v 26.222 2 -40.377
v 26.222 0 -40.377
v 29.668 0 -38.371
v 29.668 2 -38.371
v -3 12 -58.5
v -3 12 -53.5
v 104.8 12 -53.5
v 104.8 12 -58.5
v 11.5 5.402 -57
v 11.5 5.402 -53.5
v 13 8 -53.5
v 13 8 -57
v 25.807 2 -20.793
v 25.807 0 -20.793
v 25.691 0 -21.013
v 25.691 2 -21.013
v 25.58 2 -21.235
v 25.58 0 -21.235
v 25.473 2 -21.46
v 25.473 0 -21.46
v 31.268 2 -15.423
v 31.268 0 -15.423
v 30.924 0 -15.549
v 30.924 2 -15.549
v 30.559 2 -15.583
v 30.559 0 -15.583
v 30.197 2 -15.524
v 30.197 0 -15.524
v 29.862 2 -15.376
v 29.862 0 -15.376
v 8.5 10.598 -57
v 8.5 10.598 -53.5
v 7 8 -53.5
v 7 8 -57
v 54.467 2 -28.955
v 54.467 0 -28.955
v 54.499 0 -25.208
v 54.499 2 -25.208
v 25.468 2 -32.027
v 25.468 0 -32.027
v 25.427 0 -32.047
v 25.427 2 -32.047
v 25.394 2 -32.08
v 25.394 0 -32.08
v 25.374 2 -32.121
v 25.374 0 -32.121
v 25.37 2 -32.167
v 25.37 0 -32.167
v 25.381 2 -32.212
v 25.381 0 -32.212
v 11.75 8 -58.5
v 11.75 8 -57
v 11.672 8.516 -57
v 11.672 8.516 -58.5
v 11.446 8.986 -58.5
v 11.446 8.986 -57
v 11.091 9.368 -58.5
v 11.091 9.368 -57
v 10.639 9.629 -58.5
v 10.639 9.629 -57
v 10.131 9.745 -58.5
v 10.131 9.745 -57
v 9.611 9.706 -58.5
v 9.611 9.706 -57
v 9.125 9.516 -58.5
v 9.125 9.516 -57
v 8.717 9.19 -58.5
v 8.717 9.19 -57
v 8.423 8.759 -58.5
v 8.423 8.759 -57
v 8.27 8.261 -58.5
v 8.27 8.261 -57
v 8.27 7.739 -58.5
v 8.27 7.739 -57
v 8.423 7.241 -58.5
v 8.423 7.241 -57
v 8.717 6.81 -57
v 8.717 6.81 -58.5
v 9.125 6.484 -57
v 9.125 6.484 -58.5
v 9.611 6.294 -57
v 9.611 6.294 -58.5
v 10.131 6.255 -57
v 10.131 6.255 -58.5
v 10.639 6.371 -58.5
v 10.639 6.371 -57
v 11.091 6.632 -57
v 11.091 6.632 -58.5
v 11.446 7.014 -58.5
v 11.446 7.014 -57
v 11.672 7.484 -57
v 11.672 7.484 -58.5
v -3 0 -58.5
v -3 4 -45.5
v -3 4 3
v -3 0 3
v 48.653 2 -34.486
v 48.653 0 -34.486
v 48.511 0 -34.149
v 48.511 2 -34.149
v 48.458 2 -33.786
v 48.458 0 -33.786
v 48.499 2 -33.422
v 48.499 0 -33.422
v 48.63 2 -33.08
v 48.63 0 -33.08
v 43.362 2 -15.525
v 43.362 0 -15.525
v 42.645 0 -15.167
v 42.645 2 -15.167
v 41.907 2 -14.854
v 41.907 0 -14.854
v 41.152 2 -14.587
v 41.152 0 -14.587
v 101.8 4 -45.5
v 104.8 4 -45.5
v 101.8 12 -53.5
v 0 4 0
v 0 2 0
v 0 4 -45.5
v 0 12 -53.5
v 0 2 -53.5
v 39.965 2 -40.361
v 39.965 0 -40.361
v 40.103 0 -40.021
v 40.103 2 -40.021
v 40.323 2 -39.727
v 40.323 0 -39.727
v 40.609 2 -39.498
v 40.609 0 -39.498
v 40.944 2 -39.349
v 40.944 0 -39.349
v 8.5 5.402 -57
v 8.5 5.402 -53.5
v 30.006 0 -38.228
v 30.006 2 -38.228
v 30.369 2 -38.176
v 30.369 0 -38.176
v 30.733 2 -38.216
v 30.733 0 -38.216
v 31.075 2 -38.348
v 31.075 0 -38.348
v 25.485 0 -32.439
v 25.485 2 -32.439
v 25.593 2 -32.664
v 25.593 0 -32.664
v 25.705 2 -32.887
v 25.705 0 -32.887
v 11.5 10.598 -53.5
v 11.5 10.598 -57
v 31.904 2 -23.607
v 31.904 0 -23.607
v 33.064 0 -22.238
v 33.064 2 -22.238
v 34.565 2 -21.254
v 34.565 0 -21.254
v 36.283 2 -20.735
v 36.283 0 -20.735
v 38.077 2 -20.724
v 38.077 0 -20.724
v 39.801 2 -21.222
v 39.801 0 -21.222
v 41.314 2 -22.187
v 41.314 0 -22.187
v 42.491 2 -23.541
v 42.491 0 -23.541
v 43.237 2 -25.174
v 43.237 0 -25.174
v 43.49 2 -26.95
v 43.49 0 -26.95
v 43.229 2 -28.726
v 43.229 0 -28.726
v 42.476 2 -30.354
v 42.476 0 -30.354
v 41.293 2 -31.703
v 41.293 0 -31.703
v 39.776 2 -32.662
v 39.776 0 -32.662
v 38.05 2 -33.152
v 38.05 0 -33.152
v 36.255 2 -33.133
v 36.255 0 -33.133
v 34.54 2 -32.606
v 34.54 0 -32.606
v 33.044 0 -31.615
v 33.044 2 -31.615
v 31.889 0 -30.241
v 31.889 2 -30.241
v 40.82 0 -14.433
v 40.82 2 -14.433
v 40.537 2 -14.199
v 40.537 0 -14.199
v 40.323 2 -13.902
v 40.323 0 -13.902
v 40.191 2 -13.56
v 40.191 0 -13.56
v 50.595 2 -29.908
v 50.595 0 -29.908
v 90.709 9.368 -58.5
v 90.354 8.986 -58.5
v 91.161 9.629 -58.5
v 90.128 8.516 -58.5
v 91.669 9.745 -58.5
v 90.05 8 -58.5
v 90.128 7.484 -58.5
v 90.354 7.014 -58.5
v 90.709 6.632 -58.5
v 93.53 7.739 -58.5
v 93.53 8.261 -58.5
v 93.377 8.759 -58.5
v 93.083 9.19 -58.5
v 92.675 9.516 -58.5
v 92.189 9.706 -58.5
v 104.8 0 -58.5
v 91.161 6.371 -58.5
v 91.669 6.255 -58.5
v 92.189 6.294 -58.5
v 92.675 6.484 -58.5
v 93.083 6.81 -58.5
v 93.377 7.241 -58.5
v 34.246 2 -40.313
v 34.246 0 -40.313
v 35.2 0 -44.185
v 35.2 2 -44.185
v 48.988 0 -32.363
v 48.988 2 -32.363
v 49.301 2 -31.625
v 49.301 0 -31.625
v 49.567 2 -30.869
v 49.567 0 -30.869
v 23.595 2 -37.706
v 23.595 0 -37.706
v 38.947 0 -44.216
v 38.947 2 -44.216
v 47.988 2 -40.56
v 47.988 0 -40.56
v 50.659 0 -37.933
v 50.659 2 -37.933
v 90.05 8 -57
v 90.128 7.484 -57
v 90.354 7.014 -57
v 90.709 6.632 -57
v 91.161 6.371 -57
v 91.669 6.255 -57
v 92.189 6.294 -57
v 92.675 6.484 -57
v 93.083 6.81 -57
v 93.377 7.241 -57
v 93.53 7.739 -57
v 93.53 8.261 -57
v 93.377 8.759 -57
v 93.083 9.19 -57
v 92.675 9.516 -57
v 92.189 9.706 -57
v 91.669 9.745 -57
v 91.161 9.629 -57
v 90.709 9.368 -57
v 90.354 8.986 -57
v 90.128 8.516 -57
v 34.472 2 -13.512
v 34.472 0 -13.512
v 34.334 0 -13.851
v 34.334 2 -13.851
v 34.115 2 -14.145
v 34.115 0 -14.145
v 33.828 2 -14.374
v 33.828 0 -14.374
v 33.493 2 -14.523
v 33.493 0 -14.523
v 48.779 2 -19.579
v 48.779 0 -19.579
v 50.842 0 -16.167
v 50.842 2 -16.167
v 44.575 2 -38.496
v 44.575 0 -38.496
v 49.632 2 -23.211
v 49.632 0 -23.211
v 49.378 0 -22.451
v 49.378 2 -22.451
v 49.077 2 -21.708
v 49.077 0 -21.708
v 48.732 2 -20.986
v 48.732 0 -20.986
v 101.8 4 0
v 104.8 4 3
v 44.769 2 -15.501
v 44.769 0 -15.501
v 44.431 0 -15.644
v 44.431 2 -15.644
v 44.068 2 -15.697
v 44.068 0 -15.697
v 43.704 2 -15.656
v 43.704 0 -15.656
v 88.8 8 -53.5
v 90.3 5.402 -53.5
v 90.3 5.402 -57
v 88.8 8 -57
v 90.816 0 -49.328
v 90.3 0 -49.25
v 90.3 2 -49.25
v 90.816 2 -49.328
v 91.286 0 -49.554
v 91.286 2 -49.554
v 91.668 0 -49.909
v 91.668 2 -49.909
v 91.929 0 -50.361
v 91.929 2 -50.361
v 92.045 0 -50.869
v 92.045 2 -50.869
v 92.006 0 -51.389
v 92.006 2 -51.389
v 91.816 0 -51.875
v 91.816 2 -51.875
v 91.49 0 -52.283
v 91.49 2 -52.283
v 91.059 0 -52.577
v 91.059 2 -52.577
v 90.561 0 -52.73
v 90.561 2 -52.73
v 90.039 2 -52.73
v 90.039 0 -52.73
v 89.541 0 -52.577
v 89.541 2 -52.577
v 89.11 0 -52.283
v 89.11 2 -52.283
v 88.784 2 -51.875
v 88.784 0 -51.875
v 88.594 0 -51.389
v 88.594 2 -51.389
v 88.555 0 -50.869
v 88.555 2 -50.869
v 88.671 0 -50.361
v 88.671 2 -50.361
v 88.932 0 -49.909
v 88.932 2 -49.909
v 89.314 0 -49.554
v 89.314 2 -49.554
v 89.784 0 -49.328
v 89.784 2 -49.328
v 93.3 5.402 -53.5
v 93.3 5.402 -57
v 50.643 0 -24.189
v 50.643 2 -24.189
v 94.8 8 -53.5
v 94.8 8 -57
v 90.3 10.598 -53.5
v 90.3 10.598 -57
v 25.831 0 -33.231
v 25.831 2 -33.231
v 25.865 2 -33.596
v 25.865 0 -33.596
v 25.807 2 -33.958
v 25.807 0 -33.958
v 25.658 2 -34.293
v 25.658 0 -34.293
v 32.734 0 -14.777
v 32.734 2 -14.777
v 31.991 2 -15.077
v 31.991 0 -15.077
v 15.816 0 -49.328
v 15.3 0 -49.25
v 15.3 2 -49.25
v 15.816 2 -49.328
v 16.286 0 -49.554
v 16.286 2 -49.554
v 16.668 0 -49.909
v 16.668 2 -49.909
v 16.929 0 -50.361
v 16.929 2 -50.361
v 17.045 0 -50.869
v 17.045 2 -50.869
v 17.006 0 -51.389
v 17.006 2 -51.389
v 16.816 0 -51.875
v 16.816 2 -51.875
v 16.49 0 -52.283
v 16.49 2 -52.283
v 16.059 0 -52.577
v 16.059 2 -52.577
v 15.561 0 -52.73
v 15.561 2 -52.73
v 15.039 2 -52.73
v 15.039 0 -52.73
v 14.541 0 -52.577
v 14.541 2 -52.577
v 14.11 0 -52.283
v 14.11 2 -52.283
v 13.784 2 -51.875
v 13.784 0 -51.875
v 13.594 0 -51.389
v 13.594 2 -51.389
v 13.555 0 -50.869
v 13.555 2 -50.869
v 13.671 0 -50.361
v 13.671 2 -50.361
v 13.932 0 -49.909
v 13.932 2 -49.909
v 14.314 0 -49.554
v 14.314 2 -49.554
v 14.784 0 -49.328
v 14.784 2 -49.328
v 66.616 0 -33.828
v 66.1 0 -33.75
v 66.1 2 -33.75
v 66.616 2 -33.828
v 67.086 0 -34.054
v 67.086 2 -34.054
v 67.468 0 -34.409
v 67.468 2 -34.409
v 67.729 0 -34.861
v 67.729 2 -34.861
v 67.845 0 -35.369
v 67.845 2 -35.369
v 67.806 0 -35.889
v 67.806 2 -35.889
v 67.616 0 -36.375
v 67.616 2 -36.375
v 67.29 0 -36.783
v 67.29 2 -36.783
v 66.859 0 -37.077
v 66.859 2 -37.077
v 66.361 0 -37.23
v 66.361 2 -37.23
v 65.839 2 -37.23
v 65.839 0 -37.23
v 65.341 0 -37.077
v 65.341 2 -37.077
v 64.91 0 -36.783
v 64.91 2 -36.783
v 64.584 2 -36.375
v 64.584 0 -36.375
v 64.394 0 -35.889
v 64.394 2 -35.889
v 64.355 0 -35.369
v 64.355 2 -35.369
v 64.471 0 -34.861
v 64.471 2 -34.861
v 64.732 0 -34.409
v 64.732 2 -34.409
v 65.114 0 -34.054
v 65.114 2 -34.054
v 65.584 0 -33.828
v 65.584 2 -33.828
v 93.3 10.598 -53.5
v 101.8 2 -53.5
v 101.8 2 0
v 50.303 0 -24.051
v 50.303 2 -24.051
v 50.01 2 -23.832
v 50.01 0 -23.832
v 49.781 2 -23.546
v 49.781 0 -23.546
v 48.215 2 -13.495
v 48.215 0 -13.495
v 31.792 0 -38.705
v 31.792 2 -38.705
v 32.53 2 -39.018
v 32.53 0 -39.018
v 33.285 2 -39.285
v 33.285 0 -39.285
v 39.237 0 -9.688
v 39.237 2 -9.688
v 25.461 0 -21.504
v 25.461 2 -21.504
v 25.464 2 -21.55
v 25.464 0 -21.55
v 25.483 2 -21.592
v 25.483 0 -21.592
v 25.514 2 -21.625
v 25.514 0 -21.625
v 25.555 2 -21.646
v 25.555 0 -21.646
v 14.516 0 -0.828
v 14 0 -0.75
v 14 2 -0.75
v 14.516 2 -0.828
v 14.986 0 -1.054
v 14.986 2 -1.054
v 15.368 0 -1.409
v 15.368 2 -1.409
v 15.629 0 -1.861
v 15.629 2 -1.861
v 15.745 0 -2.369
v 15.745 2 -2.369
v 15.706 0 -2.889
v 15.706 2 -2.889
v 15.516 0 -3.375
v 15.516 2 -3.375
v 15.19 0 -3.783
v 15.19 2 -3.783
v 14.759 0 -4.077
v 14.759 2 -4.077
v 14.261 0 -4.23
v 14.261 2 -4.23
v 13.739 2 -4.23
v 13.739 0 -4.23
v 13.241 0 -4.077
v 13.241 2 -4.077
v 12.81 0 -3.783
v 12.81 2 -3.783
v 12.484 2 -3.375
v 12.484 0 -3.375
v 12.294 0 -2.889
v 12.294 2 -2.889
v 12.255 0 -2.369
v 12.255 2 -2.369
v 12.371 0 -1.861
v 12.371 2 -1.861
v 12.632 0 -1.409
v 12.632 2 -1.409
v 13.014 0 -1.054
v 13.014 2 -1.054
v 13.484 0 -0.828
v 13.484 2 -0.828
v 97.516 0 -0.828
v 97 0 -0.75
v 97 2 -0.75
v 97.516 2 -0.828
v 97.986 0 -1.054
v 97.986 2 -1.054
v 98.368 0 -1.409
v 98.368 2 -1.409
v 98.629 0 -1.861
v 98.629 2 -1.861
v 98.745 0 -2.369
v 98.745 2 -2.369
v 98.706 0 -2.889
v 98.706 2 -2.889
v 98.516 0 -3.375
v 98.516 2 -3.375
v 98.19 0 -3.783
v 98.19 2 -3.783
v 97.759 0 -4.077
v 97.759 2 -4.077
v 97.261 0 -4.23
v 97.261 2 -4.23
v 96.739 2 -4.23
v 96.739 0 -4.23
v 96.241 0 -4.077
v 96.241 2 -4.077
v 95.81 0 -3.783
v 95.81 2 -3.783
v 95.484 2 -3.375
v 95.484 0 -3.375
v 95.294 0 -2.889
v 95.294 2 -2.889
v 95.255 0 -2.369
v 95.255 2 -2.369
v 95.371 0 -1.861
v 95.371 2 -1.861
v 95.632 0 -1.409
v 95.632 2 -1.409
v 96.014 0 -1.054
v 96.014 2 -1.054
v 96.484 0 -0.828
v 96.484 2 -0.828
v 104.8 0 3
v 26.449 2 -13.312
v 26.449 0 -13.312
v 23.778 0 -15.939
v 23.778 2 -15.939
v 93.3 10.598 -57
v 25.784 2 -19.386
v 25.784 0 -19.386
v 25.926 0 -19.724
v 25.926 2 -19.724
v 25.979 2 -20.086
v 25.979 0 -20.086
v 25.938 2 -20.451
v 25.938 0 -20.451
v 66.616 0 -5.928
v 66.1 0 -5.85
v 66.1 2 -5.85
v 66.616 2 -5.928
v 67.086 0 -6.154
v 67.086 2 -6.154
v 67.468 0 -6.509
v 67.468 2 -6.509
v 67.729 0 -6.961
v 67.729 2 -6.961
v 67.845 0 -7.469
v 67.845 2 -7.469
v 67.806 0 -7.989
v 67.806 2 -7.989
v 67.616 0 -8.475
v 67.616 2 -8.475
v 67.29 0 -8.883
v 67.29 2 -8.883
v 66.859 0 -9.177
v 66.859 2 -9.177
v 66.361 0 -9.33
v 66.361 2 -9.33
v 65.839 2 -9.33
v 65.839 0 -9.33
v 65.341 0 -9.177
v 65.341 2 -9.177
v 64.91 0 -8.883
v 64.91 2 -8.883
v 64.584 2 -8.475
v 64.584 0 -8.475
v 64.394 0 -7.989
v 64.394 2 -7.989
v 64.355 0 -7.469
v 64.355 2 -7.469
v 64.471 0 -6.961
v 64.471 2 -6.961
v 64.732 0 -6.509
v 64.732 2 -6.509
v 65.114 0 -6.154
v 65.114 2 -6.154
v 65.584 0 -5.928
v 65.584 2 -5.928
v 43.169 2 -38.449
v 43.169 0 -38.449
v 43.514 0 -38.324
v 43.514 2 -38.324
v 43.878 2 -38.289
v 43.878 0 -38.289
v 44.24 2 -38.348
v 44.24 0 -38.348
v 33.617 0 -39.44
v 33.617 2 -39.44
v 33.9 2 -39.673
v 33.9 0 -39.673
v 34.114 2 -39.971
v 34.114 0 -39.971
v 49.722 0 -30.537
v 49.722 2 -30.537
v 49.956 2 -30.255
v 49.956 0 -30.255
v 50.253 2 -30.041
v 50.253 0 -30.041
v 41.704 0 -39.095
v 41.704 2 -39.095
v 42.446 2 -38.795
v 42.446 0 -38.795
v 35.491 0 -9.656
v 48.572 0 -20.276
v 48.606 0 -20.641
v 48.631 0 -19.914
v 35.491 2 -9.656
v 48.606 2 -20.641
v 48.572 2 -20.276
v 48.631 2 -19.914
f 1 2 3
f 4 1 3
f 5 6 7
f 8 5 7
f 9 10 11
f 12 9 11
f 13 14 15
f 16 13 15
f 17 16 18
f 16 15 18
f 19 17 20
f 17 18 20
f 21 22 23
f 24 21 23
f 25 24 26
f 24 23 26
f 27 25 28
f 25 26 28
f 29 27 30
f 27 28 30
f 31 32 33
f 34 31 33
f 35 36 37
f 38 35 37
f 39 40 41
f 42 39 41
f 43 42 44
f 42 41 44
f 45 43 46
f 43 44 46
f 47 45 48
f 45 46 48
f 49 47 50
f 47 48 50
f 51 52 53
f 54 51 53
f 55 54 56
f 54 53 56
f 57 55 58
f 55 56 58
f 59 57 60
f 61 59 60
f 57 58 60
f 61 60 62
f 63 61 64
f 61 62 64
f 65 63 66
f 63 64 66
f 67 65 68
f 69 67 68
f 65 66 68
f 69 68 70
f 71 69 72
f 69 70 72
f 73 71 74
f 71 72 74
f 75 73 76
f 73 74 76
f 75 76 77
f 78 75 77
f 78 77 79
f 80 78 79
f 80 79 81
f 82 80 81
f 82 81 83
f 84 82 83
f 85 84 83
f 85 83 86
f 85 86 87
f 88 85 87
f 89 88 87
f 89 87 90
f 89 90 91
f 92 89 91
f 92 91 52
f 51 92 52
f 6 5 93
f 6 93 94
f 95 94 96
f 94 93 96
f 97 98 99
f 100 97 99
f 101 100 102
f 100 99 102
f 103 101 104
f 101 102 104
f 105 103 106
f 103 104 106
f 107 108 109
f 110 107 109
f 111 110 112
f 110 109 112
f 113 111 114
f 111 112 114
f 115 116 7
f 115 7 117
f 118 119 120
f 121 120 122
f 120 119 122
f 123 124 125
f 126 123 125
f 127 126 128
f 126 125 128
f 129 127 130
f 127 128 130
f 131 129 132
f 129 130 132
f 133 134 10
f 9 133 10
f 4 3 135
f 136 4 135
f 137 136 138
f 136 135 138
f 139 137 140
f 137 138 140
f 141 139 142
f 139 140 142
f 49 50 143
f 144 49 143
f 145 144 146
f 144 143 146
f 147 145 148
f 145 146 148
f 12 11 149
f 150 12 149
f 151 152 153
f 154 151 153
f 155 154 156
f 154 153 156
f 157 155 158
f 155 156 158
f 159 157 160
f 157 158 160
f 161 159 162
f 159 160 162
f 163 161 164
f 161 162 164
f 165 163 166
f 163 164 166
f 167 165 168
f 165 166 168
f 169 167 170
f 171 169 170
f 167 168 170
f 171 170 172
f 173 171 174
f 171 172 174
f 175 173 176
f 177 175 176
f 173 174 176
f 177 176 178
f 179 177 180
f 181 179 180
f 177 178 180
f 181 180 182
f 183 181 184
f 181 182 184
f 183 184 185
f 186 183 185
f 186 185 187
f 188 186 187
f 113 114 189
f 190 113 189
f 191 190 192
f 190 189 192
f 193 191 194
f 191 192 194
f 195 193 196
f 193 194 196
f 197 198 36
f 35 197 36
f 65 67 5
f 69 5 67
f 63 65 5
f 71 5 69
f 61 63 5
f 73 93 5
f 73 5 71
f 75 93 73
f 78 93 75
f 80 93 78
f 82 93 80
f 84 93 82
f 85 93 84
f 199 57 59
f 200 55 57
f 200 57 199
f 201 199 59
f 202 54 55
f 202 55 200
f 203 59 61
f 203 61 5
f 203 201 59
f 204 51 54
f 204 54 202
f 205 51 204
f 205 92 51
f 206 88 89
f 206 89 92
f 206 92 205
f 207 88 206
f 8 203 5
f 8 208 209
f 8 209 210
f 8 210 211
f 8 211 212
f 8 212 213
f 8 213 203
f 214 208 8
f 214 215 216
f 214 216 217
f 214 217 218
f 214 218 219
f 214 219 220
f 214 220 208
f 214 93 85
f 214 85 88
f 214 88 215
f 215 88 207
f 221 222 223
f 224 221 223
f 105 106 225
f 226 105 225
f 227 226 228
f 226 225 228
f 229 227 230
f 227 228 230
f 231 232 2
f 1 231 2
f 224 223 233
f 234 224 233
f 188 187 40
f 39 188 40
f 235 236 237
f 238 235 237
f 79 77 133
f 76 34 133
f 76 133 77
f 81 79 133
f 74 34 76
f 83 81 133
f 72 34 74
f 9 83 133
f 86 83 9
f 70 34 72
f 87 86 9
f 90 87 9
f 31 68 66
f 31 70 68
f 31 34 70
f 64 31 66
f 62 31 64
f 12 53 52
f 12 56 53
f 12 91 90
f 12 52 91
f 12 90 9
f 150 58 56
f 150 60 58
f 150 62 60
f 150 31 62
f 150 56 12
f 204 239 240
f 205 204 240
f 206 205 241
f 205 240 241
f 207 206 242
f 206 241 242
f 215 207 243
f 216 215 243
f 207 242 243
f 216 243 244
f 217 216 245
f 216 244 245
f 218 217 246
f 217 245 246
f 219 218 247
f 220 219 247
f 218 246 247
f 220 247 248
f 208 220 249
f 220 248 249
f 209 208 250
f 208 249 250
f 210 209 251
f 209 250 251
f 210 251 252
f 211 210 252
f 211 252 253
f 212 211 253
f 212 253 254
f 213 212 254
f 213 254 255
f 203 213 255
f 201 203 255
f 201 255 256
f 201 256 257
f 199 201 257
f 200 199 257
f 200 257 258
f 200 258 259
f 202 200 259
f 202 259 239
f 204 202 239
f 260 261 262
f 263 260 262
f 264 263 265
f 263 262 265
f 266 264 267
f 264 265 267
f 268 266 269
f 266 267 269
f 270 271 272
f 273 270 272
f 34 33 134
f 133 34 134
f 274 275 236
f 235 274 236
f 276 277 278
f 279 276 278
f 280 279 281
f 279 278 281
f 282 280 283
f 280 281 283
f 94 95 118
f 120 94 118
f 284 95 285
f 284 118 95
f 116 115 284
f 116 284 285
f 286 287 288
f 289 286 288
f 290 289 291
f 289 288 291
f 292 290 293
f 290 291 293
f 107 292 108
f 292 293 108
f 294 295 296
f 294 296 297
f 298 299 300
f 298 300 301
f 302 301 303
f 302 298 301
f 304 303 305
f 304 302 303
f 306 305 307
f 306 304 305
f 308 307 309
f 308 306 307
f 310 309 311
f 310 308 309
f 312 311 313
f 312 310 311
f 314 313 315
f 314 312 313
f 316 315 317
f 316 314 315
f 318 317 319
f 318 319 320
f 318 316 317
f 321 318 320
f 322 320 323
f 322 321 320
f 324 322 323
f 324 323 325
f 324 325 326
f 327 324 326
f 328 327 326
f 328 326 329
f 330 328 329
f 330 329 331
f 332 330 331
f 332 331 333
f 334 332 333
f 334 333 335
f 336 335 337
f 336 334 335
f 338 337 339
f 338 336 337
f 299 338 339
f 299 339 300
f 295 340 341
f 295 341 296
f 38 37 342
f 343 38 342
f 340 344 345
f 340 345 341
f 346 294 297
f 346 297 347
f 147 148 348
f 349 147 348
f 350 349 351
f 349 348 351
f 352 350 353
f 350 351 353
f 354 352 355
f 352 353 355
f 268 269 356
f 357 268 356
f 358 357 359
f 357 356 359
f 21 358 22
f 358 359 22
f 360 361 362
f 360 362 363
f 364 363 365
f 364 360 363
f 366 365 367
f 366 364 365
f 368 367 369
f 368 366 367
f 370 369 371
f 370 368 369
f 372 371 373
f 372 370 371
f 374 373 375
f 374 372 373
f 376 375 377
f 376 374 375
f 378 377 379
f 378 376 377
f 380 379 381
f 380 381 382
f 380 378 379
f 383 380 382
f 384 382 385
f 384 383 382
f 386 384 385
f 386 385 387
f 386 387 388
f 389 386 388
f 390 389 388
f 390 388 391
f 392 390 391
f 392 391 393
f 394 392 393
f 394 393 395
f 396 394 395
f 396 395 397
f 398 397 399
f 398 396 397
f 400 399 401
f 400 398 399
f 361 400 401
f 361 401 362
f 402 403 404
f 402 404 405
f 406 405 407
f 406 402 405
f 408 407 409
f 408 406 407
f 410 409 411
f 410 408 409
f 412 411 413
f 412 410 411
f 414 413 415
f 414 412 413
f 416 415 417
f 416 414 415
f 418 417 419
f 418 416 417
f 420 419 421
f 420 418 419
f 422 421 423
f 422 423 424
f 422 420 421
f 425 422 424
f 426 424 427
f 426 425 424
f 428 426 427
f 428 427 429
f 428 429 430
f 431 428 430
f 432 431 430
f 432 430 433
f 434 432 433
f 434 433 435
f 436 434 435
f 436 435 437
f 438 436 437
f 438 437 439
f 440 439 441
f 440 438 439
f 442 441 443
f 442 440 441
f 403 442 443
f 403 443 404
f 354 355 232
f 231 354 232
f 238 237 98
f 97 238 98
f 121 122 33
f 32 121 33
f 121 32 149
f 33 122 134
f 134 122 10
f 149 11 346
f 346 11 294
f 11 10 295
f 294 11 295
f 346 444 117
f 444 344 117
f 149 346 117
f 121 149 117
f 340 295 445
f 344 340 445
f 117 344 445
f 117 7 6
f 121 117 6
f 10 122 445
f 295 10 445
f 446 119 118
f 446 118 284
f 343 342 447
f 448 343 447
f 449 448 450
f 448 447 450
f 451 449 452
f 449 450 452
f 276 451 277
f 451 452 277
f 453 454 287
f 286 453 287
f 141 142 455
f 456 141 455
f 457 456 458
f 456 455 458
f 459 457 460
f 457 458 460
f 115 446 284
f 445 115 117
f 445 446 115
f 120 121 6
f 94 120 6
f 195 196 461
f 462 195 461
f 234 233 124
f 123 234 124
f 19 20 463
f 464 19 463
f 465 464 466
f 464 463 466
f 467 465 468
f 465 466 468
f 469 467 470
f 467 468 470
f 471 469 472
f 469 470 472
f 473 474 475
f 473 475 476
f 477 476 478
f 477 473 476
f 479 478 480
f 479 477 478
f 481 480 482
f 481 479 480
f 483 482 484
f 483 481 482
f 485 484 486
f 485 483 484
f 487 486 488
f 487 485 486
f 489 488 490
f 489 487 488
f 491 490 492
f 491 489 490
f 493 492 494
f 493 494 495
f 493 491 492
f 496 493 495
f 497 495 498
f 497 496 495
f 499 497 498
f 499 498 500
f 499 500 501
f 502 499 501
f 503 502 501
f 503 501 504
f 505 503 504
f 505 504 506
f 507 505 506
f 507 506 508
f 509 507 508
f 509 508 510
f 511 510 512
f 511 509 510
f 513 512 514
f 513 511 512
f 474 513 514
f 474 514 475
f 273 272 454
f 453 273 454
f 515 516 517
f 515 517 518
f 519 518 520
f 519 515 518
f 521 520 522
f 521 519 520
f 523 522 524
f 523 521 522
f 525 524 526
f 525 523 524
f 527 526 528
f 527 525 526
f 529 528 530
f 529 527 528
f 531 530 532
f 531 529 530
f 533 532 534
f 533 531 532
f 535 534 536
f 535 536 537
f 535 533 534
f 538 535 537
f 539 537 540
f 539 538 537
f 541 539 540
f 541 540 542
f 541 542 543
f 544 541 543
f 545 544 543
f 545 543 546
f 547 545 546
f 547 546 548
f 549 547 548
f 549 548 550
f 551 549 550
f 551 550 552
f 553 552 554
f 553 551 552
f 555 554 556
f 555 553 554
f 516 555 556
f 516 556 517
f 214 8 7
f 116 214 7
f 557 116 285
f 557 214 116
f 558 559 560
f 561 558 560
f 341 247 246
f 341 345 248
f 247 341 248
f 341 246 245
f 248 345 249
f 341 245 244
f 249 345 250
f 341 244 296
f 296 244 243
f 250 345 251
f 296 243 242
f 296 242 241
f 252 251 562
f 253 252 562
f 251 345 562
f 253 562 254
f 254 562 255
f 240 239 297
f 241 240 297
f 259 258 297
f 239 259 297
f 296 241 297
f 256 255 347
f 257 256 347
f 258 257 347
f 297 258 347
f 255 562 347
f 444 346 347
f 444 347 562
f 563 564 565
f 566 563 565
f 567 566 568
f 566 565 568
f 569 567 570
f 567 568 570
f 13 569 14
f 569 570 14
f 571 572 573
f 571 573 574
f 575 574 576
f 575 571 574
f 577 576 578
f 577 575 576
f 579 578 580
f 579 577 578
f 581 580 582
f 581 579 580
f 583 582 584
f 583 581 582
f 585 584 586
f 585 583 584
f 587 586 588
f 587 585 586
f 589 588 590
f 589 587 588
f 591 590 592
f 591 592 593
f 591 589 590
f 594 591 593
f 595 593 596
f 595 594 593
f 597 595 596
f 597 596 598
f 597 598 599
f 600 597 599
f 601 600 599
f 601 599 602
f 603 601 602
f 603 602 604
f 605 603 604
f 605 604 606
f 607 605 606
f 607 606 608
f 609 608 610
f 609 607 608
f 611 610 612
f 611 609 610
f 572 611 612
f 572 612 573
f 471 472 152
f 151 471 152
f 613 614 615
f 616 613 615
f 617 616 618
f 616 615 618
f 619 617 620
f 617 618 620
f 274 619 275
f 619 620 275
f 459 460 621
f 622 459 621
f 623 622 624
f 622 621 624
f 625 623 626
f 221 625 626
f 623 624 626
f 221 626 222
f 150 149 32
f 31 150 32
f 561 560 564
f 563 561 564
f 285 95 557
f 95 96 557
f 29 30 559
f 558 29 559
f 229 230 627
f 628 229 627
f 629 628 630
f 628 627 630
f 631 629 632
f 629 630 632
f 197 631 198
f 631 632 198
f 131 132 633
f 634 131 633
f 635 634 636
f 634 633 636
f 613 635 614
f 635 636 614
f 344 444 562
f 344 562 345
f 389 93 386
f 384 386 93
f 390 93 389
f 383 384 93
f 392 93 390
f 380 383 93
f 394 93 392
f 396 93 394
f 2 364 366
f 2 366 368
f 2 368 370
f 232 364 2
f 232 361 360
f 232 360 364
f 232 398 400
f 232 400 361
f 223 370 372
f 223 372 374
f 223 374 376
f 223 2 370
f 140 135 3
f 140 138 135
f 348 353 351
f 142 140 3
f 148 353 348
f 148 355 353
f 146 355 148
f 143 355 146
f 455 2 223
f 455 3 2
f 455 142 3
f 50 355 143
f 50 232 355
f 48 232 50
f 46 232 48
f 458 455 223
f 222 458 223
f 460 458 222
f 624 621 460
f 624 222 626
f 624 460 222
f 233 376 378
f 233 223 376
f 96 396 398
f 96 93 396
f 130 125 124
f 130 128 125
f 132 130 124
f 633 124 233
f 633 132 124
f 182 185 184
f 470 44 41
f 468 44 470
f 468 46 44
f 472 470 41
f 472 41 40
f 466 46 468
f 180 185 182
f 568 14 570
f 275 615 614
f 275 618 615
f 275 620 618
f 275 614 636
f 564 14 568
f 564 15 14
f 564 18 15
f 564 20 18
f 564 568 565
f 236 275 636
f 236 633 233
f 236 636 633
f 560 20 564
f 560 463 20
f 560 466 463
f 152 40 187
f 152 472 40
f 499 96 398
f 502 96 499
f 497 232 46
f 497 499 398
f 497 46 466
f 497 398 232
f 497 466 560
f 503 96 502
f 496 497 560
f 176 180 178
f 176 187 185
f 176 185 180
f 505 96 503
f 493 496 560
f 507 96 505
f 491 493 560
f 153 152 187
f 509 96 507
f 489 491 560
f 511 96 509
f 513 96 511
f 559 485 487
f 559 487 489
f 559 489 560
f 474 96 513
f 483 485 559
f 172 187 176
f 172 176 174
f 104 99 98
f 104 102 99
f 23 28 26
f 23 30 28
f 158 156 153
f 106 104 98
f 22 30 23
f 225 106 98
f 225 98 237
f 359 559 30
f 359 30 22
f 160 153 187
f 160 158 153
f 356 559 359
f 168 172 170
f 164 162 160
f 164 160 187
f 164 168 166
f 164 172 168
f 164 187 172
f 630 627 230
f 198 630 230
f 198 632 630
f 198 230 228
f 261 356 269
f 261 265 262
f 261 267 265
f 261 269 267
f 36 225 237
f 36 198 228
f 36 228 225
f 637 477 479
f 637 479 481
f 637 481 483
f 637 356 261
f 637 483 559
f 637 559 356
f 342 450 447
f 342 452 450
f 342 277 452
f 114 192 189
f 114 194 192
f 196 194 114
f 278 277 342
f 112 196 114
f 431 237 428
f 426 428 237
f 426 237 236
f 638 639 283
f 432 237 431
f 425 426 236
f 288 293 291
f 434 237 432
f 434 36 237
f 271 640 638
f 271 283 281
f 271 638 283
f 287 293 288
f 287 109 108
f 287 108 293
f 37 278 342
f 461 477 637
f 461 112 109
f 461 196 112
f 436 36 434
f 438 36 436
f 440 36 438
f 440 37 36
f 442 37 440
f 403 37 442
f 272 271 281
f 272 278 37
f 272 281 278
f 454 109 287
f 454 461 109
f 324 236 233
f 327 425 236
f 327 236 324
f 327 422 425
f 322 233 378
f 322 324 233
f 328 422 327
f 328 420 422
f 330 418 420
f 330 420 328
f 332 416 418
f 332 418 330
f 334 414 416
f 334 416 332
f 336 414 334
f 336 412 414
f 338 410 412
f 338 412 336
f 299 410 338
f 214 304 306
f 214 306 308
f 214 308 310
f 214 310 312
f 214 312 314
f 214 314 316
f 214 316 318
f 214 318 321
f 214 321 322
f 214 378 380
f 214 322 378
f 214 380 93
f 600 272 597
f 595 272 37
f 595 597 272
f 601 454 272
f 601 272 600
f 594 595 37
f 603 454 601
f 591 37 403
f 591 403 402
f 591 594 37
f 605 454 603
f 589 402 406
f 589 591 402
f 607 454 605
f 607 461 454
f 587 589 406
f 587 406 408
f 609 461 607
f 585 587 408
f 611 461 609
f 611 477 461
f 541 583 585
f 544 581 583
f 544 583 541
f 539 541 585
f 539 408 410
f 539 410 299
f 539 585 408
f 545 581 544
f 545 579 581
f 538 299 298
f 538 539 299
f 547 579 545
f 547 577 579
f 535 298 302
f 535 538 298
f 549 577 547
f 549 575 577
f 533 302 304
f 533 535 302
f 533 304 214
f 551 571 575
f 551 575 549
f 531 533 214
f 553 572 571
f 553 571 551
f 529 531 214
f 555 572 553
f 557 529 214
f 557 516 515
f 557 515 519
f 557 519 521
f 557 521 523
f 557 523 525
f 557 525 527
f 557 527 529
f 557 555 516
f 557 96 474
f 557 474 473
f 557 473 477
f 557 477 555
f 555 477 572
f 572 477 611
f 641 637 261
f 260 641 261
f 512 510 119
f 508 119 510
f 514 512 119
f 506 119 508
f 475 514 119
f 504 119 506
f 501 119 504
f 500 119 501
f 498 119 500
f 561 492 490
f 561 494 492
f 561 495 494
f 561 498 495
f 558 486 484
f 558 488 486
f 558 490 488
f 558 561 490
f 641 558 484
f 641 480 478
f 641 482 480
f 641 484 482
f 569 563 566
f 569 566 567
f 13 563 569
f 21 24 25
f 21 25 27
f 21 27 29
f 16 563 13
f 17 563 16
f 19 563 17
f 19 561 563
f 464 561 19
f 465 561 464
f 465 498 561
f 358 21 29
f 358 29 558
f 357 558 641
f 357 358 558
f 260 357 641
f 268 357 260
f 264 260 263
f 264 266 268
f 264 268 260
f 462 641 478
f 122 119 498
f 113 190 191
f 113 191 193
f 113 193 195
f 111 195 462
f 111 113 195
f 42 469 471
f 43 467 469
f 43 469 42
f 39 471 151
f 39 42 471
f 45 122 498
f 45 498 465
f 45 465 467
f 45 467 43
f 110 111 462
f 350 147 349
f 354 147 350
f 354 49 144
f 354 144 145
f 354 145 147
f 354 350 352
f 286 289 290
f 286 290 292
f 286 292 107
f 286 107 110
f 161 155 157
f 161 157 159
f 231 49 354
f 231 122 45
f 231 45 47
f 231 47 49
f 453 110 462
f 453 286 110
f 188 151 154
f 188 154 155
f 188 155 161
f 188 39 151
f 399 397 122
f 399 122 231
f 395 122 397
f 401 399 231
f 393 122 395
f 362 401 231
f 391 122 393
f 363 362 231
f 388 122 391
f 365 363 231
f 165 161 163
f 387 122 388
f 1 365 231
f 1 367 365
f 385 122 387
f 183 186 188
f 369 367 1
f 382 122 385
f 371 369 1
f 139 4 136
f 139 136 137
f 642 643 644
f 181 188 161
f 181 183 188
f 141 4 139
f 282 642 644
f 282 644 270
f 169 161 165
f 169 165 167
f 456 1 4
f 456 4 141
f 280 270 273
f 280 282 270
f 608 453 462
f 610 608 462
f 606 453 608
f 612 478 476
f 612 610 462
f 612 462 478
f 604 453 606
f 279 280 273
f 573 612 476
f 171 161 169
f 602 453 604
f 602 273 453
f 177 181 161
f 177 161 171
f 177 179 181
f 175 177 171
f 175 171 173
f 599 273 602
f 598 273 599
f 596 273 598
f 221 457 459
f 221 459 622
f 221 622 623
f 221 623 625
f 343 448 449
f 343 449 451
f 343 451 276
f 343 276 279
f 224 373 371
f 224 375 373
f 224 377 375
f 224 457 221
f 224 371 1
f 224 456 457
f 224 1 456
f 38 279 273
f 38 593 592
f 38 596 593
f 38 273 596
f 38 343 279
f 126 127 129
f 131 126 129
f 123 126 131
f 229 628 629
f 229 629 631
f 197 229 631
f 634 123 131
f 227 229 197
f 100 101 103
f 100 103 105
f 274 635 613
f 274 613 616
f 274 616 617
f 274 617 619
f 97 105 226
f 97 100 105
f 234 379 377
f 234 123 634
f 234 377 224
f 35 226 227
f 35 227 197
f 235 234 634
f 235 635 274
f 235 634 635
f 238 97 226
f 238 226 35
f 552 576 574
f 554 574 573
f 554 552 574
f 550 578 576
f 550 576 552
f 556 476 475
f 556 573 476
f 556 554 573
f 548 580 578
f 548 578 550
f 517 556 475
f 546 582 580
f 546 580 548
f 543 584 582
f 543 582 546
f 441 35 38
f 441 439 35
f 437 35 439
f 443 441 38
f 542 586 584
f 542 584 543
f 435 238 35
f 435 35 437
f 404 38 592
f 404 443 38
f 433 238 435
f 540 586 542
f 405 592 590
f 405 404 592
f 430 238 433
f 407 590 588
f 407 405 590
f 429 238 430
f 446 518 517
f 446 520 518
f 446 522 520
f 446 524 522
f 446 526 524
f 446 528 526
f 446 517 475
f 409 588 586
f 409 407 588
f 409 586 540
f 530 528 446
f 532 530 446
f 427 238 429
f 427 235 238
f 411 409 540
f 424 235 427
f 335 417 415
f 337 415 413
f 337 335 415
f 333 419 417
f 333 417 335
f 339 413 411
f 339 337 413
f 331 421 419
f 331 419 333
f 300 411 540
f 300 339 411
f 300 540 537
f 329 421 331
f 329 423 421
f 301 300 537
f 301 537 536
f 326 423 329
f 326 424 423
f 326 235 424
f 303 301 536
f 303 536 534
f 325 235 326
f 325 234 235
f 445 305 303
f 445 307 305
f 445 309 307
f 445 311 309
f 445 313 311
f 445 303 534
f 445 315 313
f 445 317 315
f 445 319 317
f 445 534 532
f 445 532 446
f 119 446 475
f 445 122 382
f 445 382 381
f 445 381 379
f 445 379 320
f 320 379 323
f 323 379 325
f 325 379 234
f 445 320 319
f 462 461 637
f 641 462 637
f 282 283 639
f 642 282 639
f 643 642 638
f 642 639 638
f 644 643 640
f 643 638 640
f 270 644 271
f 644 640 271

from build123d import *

# Parameters (mm, degrees)
SKETCH1_W           = 107.8
SKETCH1_H           = 59.5
SKETCH1_R           = 1.75
BOSS_EXTRUDE1_DEPTH = 2
BOSS_EXTRUDE2_START = 2
SKETCH1_3_W         = 107.8
SKETCH1_3_H         = 59.5
SKETCH1_3_W_2       = 101.8
SKETCH1_3_H_2       = 53.5
SKETCH1_3_R         = 1.75
BOSS_EXTRUDE2_DEPTH = 2
SKETCH3_W           = 107.8
SKETCH3_H           = 5
BOSS_EXTRUDE3_DEPTH = 12
CHAMFER1_SIZE       = 8
CUT_EXTRUDE1_DEPTH  = 3.5
SKETCH4_4_R         = 1.75
CUT_EXTRUDE3_DEPTH  = 120.663235791


with BuildPart() as part:
    # Sketch1 → Boss-Extrude1 (new body)
    with BuildSketch(Plane(origin=(0, 0, 0), x_dir=(1, 0, 0), z_dir=(0, 1, 0))):
        with Locations((50.9, 26.75)):
            Rectangle(SKETCH1_W, SKETCH1_H)
        with Locations(Location((15.3, 51, 0), (0, 0, 270))):
            Circle(SKETCH1_R, mode=Mode.SUBTRACT)
        with Locations(Location((14, 2.5, 0), (0, 0, 270))):
            Circle(SKETCH1_R, mode=Mode.SUBTRACT)
        with Locations(Location((90.3, 51, 0), (0, 0, 270))):
            Circle(SKETCH1_R, mode=Mode.SUBTRACT)
        with Locations(Location((97, 2.5, 0), (0, 0, 270))):
            Circle(SKETCH1_R, mode=Mode.SUBTRACT)
        with Locations(Location((66.1, 35.5, 0), (0, 0, 270))):
            Circle(SKETCH1_R, mode=Mode.SUBTRACT)
        with Locations(Location((66.1, 7.6, 0), (0, 0, 270))):
            Circle(SKETCH1_R, mode=Mode.SUBTRACT)
        with BuildLine():
            Line((23.594839055, 37.705508722), (26.221634516, 40.37685674))
            Line((26.221634516, 40.37685674), (29.668285754, 38.370965683))
            ThreePointArc((29.668285754, 38.370965683), (30.368695169, 38.175736851), (31.075200762, 38.347601602))
            ThreePointArc((31.075200762, 38.347601602), (32.158474755, 38.867522419), (33.285245302, 39.284881177))
            ThreePointArc((33.285245302, 39.284881177), (33.899901464, 39.673320939), (34.246417166, 40.312550564))
            Line((34.246417166, 40.312550564), (35.200205995, 44.184667628))
            Line((35.200205995, 44.184667628), (38.946559177, 44.216171044))
            Line((38.946559177, 44.216171044), (39.96533047, 40.360641412))
            ThreePointArc((39.96533047, 40.360641412), (40.322547086, 39.727329534), (40.943648713, 39.349281369))
            ThreePointArc((40.943648713, 39.349281369), (42.077278635, 38.950930518), (43.169142938, 38.449300631))
            ThreePointArc((43.169142938, 38.449300631), (43.878438868, 38.28934148), (44.575466073, 38.49632148))
            Line((44.575466073, 38.49632148), (47.987896856, 40.559891165))
            Line((47.987896856, 40.559891165), (50.659244873, 37.933095705))
            Line((50.659244873, 37.933095705), (48.653353816, 34.486444467))
            ThreePointArc((48.653353816, 34.486444467), (48.458124984, 33.786035052), (48.629989735, 33.079529459))
            ThreePointArc((48.629989735, 33.079529459), (49.149910552, 31.996255466), (49.56726931, 30.869484918))
            ThreePointArc((49.56726931, 30.869484918), (49.955709072, 30.254828756), (50.594938697, 29.908313054))
            Line((50.594938697, 29.908313054), (54.467055761, 28.954524225))
            Line((54.467055761, 28.954524225), (54.498559177, 25.208171044))
            Line((54.498559177, 25.208171044), (50.643029545, 24.18939975))
            ThreePointArc((50.643029545, 24.18939975), (50.009717667, 23.832183134), (49.631669502, 23.211081507))
            ThreePointArc((49.631669502, 23.211081507), (49.233318651, 22.077451586), (48.731688764, 20.985587282))
            ThreePointArc((48.731688764, 20.985587282), (48.571729613, 20.276291353), (48.778709614, 19.579264147))
            Line((48.778709614, 19.579264147), (50.842279299, 16.166833365))
            Line((50.842279299, 16.166833365), (48.215483838, 13.495485347))
            Line((48.215483838, 13.495485347), (44.7688326, 15.501376404))
            ThreePointArc((44.7688326, 15.501376404), (44.068423185, 15.696605237), (43.361917592, 15.524740485))
            ThreePointArc((43.361917592, 15.524740485), (42.278643599, 15.004819668), (41.151873051, 14.58746091))
            ThreePointArc((41.151873051, 14.58746091), (40.537216889, 14.199021149), (40.190701187, 13.559791523))
            Line((40.190701187, 13.559791523), (39.236912358, 9.687674459))
            Line((39.236912358, 9.687674459), (35.490559177, 9.656171044))
            Line((35.490559177, 9.656171044), (34.471787883, 13.511700675))
            ThreePointArc((34.471787883, 13.511700675), (34.114571267, 14.145012554), (33.49346964, 14.523060718))
            ThreePointArc((33.49346964, 14.523060718), (32.359839719, 14.921411569), (31.267975415, 15.423041456))
            ThreePointArc((31.267975415, 15.423041456), (30.558679486, 15.583000607), (29.86165228, 15.376020607))
            Line((29.86165228, 15.376020607), (26.449221498, 13.312450922))
            Line((26.449221498, 13.312450922), (23.77787348, 15.939246383))
            Line((23.77787348, 15.939246383), (25.783764538, 19.38589762))
            ThreePointArc((25.783764538, 19.38589762), (25.97899337, 20.086307036), (25.807128618, 20.792812629))
            ThreePointArc((25.807128618, 20.792812629), (25.63505412, 21.123769595), (25.472575587, 21.45954165))
            ThreePointArc((25.472575587, 21.45954165), (25.471521134, 21.57140422), (25.555142885, 21.645712693))
            Line((25.555142885, 21.645712693), (31.904076526, 23.60710923))
            ThreePointArc((31.904076526, 23.60710923), (43.489618325, 26.950155118), (31.889282249, 30.24149793))
            Line((31.889282249, 30.24149793), (25.46834976, 32.027118633))
            ThreePointArc((25.46834976, 32.027118633), (25.382322518, 32.099718242), (25.381148957, 32.212279391))
            ThreePointArc((25.381148957, 32.212279391), (25.538419769, 32.551858304), (25.705429589, 32.886754805))
            ThreePointArc((25.705429589, 32.886754805), (25.86538874, 33.596050734), (25.65840874, 34.29307794))
            Line((25.65840874, 34.29307794), (23.594839055, 37.705508722))
        make_face(mode=Mode.SUBTRACT)
    extrude(amount=BOSS_EXTRUDE1_DEPTH)

    # Sketch1<3> → Boss-Extrude2 (add)
    # profile 1 of 8: a face of its own
    with BuildSketch(Plane(origin=(0, 0, 0), x_dir=(1, 0, 0), z_dir=(0, 1, 0)).offset(BOSS_EXTRUDE2_START)):
        with Locations((50.9, 26.75)):
            Rectangle(SKETCH1_3_W, SKETCH1_3_H)
        with Locations((50.9, 26.75)):
            Rectangle(SKETCH1_3_W_2, SKETCH1_3_H_2, mode=Mode.SUBTRACT)
    # profile 2 of 8: a face of its own
    with BuildSketch(Plane(origin=(0, 0, 0), x_dir=(1, 0, 0), z_dir=(0, 1, 0)).offset(BOSS_EXTRUDE2_START)):
        with Locations(Location((66.1, 7.6, 0), (0, 0, 270))):
            Circle(SKETCH1_3_R)
    # profile 3 of 8: a face of its own
    with BuildSketch(Plane(origin=(0, 0, 0), x_dir=(1, 0, 0), z_dir=(0, 1, 0)).offset(BOSS_EXTRUDE2_START)):
        with Locations(Location((66.1, 35.5, 0), (0, 0, 270))):
            Circle(SKETCH1_3_R)
    # profile 4 of 8: a face of its own
    with BuildSketch(Plane(origin=(0, 0, 0), x_dir=(1, 0, 0), z_dir=(0, 1, 0)).offset(BOSS_EXTRUDE2_START)):
        with Locations(Location((97, 2.5, 0), (0, 0, 270))):
            Circle(SKETCH1_3_R)
    # profile 5 of 8: a face of its own
    with BuildSketch(Plane(origin=(0, 0, 0), x_dir=(1, 0, 0), z_dir=(0, 1, 0)).offset(BOSS_EXTRUDE2_START)):
        with Locations(Location((90.3, 51, 0), (0, 0, 270))):
            Circle(SKETCH1_3_R)
    # profile 6 of 8: a face of its own
    with BuildSketch(Plane(origin=(0, 0, 0), x_dir=(1, 0, 0), z_dir=(0, 1, 0)).offset(BOSS_EXTRUDE2_START)):
        with Locations(Location((14, 2.5, 0), (0, 0, 270))):
            Circle(SKETCH1_3_R)
    # profile 7 of 8: a face of its own
    with BuildSketch(Plane(origin=(0, 0, 0), x_dir=(1, 0, 0), z_dir=(0, 1, 0)).offset(BOSS_EXTRUDE2_START)):
        with Locations(Location((15.3, 51, 0), (0, 0, 270))):
            Circle(SKETCH1_3_R)
    # profile 8 of 8: a face of its own
    with BuildSketch(Plane(origin=(0, 0, 0), x_dir=(1, 0, 0), z_dir=(0, 1, 0)).offset(BOSS_EXTRUDE2_START)):
        with BuildLine():
            Line((23.594839055, 37.705508722), (26.221634516, 40.37685674))
            Line((26.221634516, 40.37685674), (29.668285754, 38.370965683))
            ThreePointArc((29.668285754, 38.370965683), (30.368695169, 38.175736851), (31.075200762, 38.347601602))
            ThreePointArc((31.075200762, 38.347601602), (32.158474755, 38.867522419), (33.285245302, 39.284881177))
            ThreePointArc((33.285245302, 39.284881177), (33.899901464, 39.673320939), (34.246417166, 40.312550564))
            Line((34.246417166, 40.312550564), (35.200205995, 44.184667628))
            Line((35.200205995, 44.184667628), (38.946559177, 44.216171044))
            Line((38.946559177, 44.216171044), (39.96533047, 40.360641412))
            ThreePointArc((39.96533047, 40.360641412), (40.322547086, 39.727329534), (40.943648713, 39.349281369))
            ThreePointArc((40.943648713, 39.349281369), (42.077278635, 38.950930518), (43.169142938, 38.449300631))
            ThreePointArc((43.169142938, 38.449300631), (43.878438868, 38.28934148), (44.575466073, 38.49632148))
            Line((44.575466073, 38.49632148), (47.987896856, 40.559891165))
            Line((47.987896856, 40.559891165), (50.659244873, 37.933095705))
            Line((50.659244873, 37.933095705), (48.653353816, 34.486444467))
            ThreePointArc((48.653353816, 34.486444467), (48.458124984, 33.786035052), (48.629989735, 33.079529459))
            ThreePointArc((48.629989735, 33.079529459), (49.149910552, 31.996255466), (49.56726931, 30.869484918))
            ThreePointArc((49.56726931, 30.869484918), (49.955709072, 30.254828756), (50.594938697, 29.908313054))
            Line((50.594938697, 29.908313054), (54.467055761, 28.954524225))
            Line((54.467055761, 28.954524225), (54.498559177, 25.208171044))
            Line((54.498559177, 25.208171044), (50.643029545, 24.18939975))
            ThreePointArc((50.643029545, 24.18939975), (50.009717667, 23.832183134), (49.631669502, 23.211081507))
            ThreePointArc((49.631669502, 23.211081507), (49.233318651, 22.077451586), (48.731688764, 20.985587282))
            ThreePointArc((48.731688764, 20.985587282), (48.571729613, 20.276291353), (48.778709614, 19.579264147))
            Line((48.778709614, 19.579264147), (50.842279299, 16.166833365))
            Line((50.842279299, 16.166833365), (48.215483838, 13.495485347))
            Line((48.215483838, 13.495485347), (44.7688326, 15.501376404))
            ThreePointArc((44.7688326, 15.501376404), (44.068423185, 15.696605237), (43.361917592, 15.524740485))
            ThreePointArc((43.361917592, 15.524740485), (42.278643599, 15.004819668), (41.151873051, 14.58746091))
            ThreePointArc((41.151873051, 14.58746091), (40.537216889, 14.199021149), (40.190701187, 13.559791523))
            Line((40.190701187, 13.559791523), (39.236912358, 9.687674459))
            Line((39.236912358, 9.687674459), (35.490559177, 9.656171044))
            Line((35.490559177, 9.656171044), (34.471787883, 13.511700675))
            ThreePointArc((34.471787883, 13.511700675), (34.114571267, 14.145012554), (33.49346964, 14.523060718))
            ThreePointArc((33.49346964, 14.523060718), (32.359839719, 14.921411569), (31.267975415, 15.423041456))
            ThreePointArc((31.267975415, 15.423041456), (30.558679486, 15.583000607), (29.86165228, 15.376020607))
            Line((29.86165228, 15.376020607), (26.449221498, 13.312450922))
            Line((26.449221498, 13.312450922), (23.77787348, 15.939246383))
            Line((23.77787348, 15.939246383), (25.783764538, 19.38589762))
            ThreePointArc((25.783764538, 19.38589762), (25.97899337, 20.086307036), (25.807128618, 20.792812629))
            ThreePointArc((25.807128618, 20.792812629), (25.63505412, 21.123769595), (25.472575587, 21.45954165))
            ThreePointArc((25.472575587, 21.45954165), (25.471521134, 21.57140422), (25.555142885, 21.645712693))
            Line((25.555142885, 21.645712693), (31.904076526, 23.60710923))
            ThreePointArc((31.904076526, 23.60710923), (43.489618325, 26.950155118), (31.889282249, 30.24149793))
            Line((31.889282249, 30.24149793), (25.46834976, 32.027118633))
            ThreePointArc((25.46834976, 32.027118633), (25.382322518, 32.099718242), (25.381148957, 32.212279391))
            ThreePointArc((25.381148957, 32.212279391), (25.538419769, 32.551858304), (25.705429589, 32.886754805))
            ThreePointArc((25.705429589, 32.886754805), (25.86538874, 33.596050734), (25.65840874, 34.29307794))
            Line((25.65840874, 34.29307794), (23.594839055, 37.705508722))
        make_face()
    extrude(amount=BOSS_EXTRUDE2_DEPTH)


with BuildPart() as boss_extrude2_kept_piece:
    # of the separate pieces the step leaves, the one the design keeps (boss_extrude2_pieces_kept)
    add(part.part.solids().sort_by_distance((-3, 0, -56.5))[0])

    # Sketch3 → Boss-Extrude3 (add)
    with BuildSketch(Plane.XZ):
        with Locations((50.9, -56)):
            Rectangle(SKETCH3_W, SKETCH3_H)
    extrude(amount=-BOSS_EXTRUDE3_DEPTH)

    # Chamfer1
    chamfer1_edges = [boss_extrude2_kept_piece.edges().sort_by_distance(p)[0] for p in [
        (-1.5, 4, -53.5),
        (103.3, 4, -53.5),
    ]]
    chamfer(chamfer1_edges, length=CHAMFER1_SIZE - 0.0001)  # a hair under: the kernel refuses the full size

    # Sketch4 → Cut-Extrude1 (cut)
    with BuildSketch(Plane.XY.offset(-53.5)):
        Polygon((11.5, 10.598076211), (8.5, 10.598076211), (7, 8), (8.5, 5.401923789), (11.5, 5.401923789), (13, 8), align=None)
        Polygon((90.3, 10.598076211), (93.3, 10.598076211), (94.8, 8), (93.3, 5.401923789), (90.3, 5.401923789), (88.8, 8), align=None)
    extrude(amount=-CUT_EXTRUDE1_DEPTH, mode=Mode.SUBTRACT)

    # Sketch4<4> → Cut-Extrude3 (cut, through all)
    with BuildSketch(Plane.XY.offset(-53.5)):
        with Locations((10, 8)):
            Circle(SKETCH4_4_R)
        with Locations(Location((91.8, 8, 0), (0, 0, 180))):
            Circle(SKETCH4_4_R)
    extrude(amount=-CUT_EXTRUDE3_DEPTH, mode=Mode.SUBTRACT)


solid = boss_extrude2_kept_piece.part
